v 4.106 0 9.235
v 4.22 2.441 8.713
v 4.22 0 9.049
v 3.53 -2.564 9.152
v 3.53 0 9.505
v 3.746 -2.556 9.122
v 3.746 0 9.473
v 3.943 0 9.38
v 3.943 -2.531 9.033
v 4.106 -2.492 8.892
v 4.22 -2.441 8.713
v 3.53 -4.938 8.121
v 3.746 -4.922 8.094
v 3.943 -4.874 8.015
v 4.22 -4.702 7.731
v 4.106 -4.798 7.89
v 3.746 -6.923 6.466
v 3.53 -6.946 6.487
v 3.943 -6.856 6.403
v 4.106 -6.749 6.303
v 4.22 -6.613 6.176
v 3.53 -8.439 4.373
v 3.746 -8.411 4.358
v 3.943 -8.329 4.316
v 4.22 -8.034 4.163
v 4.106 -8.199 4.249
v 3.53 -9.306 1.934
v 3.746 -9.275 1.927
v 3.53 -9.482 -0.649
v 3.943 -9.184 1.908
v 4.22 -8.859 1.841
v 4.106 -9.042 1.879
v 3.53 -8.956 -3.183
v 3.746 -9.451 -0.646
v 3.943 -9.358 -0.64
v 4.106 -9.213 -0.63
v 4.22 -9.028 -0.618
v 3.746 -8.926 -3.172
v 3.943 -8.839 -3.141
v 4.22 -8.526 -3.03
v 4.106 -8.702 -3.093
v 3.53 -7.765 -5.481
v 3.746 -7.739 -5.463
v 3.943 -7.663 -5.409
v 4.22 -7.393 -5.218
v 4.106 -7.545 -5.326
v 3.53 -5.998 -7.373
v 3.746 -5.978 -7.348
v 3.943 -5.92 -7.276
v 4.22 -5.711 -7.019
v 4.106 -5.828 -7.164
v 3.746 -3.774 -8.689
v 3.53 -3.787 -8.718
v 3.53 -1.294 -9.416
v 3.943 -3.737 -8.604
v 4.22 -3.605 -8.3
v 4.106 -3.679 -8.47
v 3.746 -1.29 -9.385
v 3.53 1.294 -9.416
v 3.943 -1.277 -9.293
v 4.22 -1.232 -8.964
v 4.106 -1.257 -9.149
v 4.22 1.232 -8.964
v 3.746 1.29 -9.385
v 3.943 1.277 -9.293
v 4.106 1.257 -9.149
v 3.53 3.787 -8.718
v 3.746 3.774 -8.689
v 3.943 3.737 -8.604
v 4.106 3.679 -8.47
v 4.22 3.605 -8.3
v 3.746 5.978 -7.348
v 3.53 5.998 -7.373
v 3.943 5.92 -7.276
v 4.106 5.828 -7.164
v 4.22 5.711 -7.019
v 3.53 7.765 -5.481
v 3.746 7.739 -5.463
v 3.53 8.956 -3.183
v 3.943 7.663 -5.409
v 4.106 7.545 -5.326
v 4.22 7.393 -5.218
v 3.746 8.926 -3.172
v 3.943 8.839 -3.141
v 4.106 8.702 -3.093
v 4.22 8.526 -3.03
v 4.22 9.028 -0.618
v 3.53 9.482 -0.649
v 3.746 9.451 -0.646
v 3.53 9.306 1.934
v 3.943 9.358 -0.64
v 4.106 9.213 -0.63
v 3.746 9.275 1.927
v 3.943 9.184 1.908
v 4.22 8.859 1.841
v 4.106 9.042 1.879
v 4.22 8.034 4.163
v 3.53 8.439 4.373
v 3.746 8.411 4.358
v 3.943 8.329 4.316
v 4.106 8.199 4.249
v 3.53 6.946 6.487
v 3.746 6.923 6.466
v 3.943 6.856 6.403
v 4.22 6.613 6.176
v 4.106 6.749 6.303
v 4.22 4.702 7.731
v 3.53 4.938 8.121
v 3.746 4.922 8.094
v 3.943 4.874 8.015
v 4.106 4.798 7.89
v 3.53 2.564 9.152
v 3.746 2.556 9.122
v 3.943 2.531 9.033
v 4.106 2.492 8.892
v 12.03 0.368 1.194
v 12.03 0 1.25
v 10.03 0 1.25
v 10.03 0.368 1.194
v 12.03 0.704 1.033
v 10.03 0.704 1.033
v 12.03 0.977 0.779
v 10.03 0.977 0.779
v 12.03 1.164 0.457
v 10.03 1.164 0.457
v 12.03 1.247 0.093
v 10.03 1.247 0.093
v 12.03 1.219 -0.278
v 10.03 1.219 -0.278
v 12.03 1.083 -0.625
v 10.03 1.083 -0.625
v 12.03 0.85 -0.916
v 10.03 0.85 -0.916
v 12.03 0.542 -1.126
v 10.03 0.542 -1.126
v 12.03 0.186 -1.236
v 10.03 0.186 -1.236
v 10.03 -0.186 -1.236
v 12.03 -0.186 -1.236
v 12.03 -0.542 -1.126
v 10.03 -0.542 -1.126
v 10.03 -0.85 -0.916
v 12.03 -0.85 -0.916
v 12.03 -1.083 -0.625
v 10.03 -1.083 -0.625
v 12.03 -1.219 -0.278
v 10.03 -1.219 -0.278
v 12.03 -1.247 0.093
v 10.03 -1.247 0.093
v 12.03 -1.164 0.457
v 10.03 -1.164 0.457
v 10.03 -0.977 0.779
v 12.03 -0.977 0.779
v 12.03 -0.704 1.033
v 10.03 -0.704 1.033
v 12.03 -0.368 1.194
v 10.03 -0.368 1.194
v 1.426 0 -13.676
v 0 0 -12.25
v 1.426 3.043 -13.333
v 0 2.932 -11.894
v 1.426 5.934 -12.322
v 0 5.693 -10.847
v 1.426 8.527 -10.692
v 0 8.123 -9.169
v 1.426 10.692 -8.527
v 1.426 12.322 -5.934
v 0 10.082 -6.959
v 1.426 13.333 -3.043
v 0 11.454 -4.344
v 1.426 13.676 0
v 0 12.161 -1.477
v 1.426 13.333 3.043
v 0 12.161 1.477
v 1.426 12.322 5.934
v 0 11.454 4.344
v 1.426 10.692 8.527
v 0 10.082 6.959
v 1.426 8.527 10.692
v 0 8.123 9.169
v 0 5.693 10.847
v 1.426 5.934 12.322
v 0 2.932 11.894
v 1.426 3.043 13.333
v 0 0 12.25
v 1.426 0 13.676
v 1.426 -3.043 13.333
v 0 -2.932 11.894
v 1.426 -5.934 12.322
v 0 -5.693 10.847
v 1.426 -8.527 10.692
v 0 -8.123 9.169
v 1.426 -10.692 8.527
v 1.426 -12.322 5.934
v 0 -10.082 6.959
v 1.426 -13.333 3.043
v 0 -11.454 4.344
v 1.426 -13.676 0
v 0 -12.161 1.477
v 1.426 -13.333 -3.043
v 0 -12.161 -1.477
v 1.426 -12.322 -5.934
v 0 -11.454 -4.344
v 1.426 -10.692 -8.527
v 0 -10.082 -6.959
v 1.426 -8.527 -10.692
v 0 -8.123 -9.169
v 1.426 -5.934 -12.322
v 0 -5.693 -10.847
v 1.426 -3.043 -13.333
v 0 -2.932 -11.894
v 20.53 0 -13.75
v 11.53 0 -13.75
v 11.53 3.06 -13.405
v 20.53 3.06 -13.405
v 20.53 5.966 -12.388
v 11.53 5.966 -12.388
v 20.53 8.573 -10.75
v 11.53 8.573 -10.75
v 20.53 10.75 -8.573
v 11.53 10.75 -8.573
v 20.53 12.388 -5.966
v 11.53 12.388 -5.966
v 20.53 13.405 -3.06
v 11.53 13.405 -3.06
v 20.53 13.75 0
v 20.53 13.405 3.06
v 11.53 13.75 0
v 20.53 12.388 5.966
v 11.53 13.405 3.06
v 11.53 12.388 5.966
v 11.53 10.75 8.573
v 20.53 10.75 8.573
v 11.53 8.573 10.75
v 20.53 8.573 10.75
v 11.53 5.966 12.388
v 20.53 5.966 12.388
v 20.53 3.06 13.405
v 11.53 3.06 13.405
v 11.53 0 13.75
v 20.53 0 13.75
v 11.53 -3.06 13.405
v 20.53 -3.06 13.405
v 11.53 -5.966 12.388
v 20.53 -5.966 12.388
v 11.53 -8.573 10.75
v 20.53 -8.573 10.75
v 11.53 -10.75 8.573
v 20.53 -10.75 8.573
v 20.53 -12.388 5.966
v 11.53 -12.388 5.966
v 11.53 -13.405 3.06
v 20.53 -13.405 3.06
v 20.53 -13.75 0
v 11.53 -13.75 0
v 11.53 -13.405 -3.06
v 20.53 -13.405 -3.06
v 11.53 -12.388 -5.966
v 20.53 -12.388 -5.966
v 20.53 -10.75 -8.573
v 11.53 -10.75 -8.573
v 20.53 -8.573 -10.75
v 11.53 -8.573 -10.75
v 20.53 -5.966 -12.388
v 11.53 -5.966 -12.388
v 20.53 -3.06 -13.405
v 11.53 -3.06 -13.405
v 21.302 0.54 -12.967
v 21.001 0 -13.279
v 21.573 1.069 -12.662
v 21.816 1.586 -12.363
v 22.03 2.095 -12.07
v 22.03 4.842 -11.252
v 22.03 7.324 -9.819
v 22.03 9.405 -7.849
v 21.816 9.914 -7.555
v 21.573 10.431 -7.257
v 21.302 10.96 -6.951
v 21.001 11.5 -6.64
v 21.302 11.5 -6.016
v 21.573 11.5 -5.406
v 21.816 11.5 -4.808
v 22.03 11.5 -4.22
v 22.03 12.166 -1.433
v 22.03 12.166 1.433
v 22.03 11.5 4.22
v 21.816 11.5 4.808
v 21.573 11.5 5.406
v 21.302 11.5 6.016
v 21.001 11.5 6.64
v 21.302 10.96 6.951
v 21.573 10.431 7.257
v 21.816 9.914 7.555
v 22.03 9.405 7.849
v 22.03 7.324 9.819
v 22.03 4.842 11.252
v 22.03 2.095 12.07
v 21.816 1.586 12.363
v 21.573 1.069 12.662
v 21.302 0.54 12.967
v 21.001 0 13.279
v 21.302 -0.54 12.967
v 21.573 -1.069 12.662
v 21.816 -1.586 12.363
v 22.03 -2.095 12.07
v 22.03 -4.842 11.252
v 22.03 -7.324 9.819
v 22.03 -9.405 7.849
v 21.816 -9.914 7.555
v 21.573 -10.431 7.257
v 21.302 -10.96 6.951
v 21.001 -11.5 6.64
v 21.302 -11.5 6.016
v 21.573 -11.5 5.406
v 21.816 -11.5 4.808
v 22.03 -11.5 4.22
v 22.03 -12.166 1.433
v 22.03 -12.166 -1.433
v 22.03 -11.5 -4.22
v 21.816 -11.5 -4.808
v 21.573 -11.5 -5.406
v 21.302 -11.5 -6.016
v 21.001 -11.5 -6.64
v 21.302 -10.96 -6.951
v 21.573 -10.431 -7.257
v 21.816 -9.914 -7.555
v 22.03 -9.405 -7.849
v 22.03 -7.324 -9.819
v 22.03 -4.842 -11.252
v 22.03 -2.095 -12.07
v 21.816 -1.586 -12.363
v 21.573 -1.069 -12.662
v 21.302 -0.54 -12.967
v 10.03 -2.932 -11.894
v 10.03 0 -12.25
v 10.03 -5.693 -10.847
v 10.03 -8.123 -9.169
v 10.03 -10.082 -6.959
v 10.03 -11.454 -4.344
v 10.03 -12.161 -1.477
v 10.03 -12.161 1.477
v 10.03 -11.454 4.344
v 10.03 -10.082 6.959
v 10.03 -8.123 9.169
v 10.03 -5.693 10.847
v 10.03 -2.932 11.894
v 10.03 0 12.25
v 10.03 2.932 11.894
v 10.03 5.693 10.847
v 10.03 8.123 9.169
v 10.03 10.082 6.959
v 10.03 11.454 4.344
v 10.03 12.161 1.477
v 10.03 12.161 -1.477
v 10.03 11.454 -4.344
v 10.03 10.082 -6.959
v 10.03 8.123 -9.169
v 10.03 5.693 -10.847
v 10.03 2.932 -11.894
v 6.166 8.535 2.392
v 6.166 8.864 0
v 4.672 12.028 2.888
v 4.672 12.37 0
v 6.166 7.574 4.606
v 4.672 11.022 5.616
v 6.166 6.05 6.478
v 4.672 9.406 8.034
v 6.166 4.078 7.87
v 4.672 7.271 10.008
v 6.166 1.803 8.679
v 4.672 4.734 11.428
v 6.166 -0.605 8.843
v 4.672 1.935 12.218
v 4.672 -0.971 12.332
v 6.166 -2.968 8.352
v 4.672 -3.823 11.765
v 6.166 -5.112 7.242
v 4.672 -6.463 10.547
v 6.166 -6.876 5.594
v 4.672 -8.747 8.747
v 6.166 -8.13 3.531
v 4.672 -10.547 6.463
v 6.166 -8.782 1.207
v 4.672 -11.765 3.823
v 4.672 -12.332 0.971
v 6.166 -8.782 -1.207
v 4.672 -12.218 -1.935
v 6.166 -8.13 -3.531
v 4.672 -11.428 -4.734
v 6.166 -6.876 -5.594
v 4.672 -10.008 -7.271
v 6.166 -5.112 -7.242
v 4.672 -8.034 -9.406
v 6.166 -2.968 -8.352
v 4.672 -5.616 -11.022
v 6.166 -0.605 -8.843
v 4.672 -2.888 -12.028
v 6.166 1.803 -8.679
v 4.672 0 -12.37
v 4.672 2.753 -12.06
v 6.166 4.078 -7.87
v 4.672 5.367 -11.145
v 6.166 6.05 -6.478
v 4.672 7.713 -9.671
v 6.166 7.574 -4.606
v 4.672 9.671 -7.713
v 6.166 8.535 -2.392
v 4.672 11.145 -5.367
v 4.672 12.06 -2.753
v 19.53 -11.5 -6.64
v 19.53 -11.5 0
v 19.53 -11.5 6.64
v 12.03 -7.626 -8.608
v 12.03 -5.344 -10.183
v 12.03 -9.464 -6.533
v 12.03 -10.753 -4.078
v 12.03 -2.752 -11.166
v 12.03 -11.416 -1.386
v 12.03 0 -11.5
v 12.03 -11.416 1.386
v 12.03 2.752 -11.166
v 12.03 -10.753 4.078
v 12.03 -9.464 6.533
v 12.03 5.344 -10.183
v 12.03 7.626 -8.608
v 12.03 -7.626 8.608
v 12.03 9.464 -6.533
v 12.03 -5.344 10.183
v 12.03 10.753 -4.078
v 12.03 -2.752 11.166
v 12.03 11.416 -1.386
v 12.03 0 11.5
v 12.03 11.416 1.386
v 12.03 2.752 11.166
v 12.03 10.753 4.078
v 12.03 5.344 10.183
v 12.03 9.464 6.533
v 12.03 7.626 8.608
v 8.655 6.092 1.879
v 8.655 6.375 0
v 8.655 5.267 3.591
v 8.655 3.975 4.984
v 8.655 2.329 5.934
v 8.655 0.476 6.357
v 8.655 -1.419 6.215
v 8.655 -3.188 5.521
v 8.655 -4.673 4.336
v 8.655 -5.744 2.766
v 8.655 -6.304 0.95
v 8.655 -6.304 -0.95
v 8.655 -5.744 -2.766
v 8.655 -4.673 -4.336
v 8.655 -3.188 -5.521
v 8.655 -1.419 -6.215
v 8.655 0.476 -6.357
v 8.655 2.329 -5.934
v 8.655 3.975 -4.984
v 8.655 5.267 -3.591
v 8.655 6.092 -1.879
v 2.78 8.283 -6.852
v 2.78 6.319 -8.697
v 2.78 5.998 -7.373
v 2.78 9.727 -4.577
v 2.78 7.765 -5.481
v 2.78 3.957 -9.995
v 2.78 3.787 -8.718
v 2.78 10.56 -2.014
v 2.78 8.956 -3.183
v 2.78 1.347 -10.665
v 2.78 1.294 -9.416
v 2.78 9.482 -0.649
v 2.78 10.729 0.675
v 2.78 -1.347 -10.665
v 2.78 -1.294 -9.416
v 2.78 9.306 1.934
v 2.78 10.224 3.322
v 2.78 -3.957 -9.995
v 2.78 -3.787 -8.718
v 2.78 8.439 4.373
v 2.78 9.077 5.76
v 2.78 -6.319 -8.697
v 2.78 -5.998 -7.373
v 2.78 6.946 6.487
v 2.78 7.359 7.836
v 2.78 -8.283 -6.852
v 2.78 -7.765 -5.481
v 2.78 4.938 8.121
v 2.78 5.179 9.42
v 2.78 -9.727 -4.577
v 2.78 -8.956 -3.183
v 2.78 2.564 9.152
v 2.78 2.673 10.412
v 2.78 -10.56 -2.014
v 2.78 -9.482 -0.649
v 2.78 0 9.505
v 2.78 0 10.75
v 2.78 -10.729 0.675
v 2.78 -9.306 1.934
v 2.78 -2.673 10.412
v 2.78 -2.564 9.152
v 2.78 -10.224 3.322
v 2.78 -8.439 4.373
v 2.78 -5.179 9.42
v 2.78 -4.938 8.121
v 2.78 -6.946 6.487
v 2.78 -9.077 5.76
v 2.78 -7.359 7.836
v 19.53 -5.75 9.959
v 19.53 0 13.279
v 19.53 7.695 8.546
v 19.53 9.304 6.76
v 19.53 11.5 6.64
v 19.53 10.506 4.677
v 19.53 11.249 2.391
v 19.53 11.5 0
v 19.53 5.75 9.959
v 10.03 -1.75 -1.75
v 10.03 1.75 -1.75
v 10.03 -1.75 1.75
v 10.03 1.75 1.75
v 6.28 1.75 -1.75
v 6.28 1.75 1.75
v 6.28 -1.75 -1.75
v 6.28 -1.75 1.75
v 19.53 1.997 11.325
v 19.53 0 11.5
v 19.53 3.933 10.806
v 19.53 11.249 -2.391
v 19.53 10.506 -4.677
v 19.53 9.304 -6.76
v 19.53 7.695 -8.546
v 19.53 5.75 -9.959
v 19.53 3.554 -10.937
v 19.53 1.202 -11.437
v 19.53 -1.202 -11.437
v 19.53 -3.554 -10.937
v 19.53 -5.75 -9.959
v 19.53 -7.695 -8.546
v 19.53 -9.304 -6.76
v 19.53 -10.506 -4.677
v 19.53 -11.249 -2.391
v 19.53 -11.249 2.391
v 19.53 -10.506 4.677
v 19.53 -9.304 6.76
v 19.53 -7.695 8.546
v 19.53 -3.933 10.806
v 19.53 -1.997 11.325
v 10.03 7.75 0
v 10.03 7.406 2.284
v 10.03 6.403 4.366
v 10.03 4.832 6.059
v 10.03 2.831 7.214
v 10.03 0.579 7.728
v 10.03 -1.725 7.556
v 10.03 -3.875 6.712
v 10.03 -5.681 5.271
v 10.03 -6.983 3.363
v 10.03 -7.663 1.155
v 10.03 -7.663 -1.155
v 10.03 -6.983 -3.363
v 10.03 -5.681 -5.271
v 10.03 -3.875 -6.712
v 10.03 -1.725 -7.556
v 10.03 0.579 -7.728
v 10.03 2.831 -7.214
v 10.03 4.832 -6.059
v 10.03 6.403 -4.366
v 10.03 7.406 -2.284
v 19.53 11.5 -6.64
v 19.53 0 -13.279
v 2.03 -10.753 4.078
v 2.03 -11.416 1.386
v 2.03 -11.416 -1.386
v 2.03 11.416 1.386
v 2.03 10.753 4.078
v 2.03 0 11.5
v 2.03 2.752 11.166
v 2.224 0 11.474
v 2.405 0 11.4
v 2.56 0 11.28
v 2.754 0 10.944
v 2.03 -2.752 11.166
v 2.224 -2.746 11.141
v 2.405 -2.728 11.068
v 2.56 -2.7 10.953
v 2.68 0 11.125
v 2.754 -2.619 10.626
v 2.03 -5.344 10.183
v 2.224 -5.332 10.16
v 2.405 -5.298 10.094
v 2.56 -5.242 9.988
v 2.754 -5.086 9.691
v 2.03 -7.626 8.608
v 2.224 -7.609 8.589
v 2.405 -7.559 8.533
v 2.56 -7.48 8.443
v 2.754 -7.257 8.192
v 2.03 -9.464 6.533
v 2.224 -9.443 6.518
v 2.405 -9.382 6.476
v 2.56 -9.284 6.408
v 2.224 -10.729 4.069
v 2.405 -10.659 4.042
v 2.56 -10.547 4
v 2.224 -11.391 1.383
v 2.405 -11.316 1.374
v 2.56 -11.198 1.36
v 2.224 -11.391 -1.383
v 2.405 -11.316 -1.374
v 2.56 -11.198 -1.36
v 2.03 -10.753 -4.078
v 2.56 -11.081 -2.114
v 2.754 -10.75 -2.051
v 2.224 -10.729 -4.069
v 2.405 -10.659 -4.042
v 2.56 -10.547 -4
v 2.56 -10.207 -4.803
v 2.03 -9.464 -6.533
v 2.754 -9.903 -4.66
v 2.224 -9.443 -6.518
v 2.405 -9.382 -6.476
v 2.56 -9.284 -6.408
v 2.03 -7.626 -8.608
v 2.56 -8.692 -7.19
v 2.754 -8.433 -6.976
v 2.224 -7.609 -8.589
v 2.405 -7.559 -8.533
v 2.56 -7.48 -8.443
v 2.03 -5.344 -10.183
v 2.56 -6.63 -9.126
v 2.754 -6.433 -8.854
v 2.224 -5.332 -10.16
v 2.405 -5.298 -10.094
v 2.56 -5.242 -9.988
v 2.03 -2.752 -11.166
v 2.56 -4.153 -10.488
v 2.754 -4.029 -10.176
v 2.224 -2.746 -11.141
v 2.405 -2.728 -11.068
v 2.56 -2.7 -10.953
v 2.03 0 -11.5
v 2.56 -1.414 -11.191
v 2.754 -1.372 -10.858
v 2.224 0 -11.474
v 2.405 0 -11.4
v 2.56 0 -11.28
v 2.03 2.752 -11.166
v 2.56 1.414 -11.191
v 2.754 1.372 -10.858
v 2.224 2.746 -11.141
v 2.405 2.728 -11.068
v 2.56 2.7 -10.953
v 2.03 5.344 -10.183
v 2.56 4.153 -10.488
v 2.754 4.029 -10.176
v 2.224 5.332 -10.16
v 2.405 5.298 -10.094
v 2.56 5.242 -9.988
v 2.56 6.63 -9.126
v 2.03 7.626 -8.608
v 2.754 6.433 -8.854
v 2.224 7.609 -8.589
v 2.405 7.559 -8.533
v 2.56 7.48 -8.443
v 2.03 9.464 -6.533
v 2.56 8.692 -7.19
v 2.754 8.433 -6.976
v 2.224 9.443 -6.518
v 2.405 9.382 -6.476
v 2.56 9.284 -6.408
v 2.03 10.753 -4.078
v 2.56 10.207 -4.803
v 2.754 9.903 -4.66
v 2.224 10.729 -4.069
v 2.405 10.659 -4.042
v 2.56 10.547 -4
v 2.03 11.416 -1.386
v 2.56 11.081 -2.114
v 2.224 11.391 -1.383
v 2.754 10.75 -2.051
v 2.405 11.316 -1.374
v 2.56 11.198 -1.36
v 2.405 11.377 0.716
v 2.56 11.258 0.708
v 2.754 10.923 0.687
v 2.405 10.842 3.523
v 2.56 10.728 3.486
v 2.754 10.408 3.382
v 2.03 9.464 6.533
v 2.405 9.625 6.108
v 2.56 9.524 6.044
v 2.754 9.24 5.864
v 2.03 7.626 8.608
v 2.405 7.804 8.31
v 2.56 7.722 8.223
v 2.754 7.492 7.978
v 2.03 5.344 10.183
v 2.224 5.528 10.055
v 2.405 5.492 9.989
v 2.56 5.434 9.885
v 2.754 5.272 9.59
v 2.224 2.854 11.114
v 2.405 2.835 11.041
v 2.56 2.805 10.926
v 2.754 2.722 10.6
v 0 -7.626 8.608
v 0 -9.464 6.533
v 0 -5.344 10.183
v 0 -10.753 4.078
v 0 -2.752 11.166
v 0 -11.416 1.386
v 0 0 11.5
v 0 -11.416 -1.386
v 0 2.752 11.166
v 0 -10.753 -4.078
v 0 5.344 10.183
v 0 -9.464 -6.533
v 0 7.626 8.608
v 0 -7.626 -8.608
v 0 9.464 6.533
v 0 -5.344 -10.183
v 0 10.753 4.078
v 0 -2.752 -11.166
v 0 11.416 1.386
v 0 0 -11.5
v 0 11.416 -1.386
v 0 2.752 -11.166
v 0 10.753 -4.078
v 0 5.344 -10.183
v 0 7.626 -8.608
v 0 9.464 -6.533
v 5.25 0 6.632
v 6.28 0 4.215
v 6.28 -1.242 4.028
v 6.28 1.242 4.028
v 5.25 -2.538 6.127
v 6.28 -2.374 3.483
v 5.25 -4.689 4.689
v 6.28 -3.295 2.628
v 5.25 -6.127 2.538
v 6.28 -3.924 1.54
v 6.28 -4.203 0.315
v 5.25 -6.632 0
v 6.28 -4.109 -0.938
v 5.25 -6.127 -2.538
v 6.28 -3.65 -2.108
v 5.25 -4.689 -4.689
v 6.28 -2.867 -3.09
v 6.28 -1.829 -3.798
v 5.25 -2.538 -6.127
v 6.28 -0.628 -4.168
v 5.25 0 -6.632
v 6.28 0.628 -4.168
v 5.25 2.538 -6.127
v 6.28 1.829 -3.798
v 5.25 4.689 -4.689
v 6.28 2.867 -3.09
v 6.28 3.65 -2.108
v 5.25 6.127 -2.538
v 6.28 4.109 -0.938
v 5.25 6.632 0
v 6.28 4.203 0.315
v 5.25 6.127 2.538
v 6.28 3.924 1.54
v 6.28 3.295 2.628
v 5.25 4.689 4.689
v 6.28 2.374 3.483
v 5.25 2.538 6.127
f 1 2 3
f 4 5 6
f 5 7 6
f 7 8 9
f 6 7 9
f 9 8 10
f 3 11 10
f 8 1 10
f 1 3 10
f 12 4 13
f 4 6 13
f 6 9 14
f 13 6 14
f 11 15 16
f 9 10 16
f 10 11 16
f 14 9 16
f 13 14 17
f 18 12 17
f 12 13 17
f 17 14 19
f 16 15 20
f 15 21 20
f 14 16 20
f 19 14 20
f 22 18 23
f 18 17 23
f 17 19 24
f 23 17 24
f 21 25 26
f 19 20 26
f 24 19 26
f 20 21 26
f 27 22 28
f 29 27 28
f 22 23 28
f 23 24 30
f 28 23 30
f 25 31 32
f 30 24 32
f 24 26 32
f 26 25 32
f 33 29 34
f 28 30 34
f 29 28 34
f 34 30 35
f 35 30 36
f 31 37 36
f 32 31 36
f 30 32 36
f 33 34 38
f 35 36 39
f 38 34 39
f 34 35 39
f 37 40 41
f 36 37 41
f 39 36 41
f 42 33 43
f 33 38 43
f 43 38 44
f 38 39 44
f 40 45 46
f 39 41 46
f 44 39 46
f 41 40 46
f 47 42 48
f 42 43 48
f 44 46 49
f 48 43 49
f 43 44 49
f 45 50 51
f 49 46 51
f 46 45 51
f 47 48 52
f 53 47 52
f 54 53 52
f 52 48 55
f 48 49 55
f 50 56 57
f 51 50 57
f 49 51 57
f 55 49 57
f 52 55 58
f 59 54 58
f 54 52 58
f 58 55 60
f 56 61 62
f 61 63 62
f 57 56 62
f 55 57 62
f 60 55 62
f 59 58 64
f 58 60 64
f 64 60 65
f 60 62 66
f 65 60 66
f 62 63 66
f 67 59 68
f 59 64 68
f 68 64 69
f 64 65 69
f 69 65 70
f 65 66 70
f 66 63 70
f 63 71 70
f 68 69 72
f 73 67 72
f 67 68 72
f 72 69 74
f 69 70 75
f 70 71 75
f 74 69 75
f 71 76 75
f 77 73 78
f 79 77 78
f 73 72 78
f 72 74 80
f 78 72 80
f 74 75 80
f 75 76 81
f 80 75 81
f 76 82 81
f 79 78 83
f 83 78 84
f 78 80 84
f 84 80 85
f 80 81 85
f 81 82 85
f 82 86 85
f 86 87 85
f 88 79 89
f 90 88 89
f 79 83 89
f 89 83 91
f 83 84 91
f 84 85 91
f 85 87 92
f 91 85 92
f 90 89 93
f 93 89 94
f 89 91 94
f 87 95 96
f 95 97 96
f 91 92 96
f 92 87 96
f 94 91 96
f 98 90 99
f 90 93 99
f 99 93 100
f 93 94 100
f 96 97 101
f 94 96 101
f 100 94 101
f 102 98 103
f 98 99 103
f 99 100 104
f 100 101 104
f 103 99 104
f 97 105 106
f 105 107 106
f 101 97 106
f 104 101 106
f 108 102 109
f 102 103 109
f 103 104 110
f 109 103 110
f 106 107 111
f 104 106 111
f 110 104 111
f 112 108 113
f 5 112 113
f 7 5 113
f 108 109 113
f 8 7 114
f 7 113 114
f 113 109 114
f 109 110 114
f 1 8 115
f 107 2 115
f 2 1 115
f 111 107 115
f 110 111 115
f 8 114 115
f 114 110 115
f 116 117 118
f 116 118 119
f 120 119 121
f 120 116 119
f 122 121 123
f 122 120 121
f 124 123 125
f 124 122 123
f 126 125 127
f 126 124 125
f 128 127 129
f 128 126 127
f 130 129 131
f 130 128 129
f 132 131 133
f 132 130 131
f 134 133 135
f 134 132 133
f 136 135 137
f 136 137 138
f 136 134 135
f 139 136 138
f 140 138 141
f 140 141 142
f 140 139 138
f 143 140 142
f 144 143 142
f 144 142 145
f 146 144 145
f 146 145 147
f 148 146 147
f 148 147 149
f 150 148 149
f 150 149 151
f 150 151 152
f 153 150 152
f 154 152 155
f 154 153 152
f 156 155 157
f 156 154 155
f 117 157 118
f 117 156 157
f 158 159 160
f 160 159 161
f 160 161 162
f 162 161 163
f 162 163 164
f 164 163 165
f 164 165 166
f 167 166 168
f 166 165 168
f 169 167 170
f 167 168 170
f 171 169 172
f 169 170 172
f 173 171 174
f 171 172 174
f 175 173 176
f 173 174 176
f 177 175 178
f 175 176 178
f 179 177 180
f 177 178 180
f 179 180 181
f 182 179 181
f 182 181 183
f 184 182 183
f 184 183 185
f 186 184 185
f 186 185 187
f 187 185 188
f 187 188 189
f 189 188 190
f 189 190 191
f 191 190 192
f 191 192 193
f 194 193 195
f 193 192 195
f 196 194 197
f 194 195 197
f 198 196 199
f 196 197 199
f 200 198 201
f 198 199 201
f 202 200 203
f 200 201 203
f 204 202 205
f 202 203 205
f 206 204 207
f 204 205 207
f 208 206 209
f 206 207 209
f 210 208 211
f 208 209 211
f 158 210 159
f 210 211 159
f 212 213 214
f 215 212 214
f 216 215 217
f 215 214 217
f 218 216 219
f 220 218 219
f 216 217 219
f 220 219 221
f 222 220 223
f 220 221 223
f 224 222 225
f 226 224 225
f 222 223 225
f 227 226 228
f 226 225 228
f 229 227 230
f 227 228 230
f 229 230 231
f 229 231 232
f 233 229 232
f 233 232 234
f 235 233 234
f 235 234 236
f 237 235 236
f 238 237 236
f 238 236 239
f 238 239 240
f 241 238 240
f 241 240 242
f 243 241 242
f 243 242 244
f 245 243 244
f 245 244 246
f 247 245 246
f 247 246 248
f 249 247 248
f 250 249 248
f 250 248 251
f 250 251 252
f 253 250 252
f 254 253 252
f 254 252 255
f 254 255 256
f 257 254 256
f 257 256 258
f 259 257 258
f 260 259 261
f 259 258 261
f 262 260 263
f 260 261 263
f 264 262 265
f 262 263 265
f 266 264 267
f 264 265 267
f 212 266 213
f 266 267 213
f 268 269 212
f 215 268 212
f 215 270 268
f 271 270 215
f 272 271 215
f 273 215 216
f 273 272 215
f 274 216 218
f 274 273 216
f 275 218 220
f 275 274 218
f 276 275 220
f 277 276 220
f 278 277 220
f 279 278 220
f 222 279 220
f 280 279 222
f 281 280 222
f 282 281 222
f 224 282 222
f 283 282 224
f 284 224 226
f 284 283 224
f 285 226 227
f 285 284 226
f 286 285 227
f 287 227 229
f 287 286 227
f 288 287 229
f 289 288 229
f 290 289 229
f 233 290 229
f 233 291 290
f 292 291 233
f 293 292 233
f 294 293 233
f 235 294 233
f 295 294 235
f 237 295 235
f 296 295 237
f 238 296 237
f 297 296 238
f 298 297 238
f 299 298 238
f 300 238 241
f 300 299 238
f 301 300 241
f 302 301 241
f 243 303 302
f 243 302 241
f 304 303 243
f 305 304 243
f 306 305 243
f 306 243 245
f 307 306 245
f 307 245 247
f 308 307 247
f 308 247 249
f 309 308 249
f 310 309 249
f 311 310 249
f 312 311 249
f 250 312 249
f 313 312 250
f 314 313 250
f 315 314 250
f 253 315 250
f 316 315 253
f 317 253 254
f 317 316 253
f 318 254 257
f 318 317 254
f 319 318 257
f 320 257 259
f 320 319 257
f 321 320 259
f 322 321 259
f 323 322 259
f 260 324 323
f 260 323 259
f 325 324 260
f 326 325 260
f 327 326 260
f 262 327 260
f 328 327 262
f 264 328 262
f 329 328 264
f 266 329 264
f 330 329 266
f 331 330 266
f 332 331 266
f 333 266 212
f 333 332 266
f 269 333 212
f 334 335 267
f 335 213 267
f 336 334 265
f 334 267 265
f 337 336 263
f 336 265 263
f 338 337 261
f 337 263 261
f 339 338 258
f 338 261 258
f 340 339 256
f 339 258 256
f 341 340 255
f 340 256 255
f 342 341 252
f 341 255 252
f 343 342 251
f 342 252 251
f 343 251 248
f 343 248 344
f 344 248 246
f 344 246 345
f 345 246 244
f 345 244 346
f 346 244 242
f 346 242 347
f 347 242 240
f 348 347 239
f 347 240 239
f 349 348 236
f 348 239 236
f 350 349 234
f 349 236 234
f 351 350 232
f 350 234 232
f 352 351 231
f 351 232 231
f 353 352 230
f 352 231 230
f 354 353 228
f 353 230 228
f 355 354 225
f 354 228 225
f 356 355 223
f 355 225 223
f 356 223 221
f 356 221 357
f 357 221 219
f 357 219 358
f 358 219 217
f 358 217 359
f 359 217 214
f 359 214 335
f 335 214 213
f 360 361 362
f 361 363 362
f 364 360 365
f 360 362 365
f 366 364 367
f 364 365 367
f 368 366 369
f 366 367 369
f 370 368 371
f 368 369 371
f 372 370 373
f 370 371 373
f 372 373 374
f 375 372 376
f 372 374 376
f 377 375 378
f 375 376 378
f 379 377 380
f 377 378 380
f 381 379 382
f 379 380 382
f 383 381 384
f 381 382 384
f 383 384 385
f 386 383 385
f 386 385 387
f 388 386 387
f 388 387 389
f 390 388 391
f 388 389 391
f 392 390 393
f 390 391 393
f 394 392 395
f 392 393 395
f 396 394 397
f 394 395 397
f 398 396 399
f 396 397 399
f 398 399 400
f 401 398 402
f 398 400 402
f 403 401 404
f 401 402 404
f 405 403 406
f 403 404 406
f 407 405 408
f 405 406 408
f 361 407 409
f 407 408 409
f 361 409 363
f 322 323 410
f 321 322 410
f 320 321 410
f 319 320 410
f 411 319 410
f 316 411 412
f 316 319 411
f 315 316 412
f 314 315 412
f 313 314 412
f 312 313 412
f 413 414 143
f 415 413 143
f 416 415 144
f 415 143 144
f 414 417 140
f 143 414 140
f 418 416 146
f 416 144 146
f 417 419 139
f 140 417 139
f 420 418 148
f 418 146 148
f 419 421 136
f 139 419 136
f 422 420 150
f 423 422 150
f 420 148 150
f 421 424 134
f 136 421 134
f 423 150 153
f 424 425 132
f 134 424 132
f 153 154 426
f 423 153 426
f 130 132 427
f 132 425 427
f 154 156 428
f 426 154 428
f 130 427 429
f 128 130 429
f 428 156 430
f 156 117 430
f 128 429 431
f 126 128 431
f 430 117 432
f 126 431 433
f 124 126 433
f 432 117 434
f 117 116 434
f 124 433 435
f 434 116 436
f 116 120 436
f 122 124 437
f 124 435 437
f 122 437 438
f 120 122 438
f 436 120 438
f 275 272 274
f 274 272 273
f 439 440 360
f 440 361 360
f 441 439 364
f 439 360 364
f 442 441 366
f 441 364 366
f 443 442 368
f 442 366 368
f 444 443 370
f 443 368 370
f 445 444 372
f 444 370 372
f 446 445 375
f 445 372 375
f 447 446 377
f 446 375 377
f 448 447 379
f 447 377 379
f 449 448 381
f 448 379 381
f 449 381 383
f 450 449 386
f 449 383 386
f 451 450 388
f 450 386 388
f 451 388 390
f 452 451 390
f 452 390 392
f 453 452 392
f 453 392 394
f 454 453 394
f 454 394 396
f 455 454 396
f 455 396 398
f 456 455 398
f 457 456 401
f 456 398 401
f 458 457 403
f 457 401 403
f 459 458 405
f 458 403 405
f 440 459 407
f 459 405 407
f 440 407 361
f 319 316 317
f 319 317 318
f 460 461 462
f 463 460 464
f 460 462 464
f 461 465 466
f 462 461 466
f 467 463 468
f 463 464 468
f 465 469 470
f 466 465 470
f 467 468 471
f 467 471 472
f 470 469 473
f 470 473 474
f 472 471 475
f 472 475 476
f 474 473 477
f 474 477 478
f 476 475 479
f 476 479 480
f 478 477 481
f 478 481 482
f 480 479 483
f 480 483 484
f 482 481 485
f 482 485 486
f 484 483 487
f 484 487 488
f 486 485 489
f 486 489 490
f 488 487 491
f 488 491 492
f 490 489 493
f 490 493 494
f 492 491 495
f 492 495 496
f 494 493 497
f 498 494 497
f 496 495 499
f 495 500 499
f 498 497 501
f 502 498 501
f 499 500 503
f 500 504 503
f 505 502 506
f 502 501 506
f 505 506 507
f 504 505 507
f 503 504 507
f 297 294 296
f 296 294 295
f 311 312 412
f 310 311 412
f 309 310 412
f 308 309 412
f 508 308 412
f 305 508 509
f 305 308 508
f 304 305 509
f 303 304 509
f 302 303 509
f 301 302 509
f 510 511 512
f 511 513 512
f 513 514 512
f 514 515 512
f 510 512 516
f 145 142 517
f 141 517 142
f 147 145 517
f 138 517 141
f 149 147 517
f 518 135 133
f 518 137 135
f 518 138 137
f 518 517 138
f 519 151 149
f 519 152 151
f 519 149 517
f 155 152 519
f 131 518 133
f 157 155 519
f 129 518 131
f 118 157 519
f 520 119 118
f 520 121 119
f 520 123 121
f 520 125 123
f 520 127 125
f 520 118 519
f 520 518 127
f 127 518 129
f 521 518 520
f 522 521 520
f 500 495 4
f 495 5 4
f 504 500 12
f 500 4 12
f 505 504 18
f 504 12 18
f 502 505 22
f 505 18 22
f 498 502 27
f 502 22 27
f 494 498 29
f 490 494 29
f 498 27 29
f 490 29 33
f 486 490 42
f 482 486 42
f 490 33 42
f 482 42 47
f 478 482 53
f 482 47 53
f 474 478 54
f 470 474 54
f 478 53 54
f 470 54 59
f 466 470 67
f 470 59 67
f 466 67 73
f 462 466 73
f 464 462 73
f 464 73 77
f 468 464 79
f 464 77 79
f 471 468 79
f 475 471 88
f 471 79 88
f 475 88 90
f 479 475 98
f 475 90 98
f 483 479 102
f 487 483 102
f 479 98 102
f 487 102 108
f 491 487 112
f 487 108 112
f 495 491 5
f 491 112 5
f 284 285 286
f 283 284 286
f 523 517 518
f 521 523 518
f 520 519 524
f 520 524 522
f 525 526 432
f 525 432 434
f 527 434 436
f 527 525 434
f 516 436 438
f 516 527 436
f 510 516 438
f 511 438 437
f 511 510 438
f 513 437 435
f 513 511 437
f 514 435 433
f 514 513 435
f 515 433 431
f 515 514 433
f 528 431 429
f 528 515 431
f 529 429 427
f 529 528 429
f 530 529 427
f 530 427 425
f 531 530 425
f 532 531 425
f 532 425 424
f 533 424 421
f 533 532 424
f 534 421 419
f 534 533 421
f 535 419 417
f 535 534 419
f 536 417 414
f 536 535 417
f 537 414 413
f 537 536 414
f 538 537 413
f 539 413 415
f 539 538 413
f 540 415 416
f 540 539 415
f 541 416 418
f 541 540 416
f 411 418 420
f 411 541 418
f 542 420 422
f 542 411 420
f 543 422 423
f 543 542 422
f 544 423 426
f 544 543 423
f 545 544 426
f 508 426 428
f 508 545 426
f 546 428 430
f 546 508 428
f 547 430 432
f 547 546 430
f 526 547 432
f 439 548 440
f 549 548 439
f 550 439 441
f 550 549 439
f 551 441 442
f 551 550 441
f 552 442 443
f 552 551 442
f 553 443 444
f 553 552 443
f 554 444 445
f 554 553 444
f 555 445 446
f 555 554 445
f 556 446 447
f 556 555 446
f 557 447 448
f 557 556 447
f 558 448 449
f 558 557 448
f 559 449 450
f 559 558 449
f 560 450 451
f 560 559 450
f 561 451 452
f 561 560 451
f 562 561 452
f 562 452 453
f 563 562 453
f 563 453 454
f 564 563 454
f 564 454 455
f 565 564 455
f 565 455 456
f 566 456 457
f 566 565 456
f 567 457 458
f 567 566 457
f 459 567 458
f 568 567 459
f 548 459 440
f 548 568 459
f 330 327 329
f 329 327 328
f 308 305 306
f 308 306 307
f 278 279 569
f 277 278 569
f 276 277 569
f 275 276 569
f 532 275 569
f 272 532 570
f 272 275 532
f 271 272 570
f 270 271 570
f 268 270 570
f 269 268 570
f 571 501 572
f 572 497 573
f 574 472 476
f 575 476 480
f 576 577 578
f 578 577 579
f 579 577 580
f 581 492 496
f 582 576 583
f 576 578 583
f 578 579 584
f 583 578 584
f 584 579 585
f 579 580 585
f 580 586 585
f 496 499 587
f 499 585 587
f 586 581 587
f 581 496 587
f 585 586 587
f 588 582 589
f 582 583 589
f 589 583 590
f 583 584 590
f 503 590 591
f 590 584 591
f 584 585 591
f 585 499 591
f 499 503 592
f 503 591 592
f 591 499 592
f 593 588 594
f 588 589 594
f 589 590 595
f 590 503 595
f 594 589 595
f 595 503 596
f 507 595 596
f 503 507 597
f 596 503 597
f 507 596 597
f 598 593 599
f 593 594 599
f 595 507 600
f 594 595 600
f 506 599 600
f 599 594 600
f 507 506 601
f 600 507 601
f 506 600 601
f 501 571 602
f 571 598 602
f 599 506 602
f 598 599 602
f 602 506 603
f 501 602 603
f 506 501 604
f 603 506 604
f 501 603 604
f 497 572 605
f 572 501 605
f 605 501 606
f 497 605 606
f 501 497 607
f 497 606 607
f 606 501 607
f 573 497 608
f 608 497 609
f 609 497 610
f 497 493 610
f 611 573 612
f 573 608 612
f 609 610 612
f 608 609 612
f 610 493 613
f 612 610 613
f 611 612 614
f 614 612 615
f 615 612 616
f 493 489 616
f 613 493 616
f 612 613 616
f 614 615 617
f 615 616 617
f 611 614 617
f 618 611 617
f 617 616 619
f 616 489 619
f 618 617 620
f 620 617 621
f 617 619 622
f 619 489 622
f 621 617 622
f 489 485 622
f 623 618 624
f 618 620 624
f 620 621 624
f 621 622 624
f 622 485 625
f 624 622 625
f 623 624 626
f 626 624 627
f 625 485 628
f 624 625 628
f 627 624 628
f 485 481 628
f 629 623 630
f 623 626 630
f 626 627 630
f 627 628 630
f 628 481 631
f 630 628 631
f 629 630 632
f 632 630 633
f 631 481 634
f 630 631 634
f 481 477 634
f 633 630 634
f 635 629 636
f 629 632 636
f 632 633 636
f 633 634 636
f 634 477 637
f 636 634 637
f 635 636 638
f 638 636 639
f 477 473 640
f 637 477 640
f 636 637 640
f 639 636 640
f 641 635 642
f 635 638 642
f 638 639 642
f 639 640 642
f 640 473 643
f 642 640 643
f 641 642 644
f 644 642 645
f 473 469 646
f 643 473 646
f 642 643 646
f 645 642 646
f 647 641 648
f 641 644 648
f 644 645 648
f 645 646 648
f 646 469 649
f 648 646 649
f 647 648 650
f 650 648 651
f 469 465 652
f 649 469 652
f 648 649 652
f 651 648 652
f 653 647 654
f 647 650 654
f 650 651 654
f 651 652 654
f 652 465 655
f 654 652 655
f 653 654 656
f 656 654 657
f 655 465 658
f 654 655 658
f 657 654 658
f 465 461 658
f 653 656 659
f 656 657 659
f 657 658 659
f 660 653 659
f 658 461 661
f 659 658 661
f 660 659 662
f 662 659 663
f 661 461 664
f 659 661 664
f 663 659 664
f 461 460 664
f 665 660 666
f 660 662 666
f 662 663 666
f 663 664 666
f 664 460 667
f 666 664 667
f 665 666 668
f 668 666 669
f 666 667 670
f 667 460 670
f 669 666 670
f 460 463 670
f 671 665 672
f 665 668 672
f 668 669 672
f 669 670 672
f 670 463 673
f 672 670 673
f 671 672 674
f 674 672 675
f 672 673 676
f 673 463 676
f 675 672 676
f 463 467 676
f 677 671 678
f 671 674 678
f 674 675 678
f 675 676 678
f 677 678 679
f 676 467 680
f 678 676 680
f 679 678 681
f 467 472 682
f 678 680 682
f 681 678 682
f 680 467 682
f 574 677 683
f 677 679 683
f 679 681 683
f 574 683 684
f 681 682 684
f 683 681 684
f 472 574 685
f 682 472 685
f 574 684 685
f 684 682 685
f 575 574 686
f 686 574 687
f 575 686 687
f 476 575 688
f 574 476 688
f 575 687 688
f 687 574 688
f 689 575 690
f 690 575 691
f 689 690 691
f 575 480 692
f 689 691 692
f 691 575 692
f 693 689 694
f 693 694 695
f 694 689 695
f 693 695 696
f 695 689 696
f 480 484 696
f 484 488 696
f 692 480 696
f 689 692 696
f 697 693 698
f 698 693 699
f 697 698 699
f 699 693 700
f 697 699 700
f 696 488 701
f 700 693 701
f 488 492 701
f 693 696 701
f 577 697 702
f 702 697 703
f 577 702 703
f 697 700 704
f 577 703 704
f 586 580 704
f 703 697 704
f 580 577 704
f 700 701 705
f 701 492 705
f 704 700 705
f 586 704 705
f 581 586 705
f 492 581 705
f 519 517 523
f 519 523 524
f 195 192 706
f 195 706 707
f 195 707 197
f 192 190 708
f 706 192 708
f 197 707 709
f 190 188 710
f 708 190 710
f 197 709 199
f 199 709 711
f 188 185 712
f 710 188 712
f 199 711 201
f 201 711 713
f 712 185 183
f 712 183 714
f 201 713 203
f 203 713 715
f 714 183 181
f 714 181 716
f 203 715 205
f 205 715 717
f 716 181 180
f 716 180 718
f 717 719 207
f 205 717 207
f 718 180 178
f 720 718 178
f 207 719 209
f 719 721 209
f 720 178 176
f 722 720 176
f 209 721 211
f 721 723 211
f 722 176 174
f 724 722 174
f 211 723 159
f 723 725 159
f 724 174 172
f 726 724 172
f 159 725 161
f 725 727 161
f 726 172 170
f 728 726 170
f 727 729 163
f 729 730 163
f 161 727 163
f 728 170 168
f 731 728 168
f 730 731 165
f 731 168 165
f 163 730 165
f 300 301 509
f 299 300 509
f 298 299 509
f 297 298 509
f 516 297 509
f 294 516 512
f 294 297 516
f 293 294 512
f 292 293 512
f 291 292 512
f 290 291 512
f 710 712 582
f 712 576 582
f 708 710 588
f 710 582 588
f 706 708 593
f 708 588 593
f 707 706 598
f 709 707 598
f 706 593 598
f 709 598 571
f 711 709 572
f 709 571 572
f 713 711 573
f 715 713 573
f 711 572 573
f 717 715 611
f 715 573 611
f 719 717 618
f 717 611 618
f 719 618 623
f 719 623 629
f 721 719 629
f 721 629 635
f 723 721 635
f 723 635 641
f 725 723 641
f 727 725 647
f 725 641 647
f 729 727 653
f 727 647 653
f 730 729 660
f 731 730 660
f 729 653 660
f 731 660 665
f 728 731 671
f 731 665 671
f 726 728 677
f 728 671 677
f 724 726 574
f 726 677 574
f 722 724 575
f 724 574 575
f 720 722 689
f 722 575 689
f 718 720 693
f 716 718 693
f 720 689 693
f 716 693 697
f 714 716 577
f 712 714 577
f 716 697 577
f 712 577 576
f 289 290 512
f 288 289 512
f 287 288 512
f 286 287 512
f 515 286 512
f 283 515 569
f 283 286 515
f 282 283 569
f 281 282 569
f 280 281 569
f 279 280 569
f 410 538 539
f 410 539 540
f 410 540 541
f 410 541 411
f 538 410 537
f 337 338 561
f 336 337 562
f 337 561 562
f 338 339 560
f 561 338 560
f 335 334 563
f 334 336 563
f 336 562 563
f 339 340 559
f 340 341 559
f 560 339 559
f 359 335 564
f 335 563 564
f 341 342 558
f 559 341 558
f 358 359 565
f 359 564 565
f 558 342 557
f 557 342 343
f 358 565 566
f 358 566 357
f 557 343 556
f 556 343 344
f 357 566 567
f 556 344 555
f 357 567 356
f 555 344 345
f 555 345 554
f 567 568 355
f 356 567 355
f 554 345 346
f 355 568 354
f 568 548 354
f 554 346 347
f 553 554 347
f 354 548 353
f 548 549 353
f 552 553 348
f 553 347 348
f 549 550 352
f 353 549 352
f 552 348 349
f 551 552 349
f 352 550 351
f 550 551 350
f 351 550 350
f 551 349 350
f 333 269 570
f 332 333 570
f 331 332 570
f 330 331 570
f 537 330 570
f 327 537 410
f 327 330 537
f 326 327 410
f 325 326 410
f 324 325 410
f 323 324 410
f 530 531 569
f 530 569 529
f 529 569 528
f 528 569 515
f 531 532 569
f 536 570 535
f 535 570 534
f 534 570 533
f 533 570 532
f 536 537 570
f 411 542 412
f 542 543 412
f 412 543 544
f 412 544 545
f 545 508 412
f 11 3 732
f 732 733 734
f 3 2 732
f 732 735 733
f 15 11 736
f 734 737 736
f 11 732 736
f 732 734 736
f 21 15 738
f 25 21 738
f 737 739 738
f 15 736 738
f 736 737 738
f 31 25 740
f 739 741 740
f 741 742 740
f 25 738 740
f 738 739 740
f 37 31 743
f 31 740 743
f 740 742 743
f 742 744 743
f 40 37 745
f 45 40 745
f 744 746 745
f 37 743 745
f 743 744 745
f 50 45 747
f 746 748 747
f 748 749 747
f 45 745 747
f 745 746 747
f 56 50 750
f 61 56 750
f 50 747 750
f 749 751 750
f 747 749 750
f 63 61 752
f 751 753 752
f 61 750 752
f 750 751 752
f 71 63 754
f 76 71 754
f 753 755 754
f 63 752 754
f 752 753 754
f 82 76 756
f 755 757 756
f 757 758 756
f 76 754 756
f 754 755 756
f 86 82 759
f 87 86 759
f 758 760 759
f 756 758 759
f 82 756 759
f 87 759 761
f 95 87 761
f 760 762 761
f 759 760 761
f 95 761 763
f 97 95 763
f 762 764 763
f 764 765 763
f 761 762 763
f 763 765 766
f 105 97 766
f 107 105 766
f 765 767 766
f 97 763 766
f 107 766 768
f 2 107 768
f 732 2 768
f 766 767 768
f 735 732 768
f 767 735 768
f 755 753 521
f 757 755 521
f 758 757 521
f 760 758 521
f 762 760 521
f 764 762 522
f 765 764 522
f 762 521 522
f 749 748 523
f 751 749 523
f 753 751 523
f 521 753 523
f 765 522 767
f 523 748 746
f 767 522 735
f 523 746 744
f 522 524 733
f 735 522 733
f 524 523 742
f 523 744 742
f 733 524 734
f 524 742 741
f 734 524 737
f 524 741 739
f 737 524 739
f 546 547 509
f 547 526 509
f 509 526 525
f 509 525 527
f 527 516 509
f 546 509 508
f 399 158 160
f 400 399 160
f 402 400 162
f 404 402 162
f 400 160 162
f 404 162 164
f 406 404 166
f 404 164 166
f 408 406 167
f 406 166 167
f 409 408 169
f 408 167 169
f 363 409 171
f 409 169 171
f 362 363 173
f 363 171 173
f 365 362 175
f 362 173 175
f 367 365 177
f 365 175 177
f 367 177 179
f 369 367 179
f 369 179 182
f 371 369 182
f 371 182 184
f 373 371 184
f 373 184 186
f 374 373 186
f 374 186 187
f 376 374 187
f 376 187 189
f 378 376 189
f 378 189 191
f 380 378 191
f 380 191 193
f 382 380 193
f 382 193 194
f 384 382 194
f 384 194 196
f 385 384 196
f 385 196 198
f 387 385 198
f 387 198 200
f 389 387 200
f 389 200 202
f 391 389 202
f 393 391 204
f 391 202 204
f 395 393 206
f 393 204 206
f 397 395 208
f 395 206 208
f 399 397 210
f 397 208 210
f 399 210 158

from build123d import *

# Parameters (mm, degrees)
SKETCH1_R           = 13.75
BOSS_EXTRUDE1_DEPTH = 22.03
SKETCH3_W           = 3.5
SKETCH3_H           = 3.5
CUT_EXTRUDE1_DEPTH  = 3.75
CUT_EXTRUDE2_START  = -12
CUT_EXTRUDE2_DEPTH  = 2.5
CUT_EXTRUDE4_START  = -9.5
SKETCH4_29_R        = 11.5
CUT_EXTRUDE4_DEPTH  = 7.5
CUT_EXTRUDE5_START  = -2
SKETCH4_30_R        = 1.25
CUT_EXTRUDE5_DEPTH  = 2
CHAMFER1_SIZE       = 1.5
CHAMFER2_SIZE       = 1.5
CHAMFER2_SIZE_2     = 2.841585372


# Read off the part's stored shape, not the designer's step: Cut-Revolve-Thin1
with BuildPart() as part:
    # Sketch1 → Boss-Extrude1 (new body)
    with BuildSketch(Plane(origin=(0, 0, 0), x_dir=(0, 0, -1), z_dir=(1, 0, 0))):
        Circle(SKETCH1_R)
    extrude(amount=BOSS_EXTRUDE1_DEPTH)

    # Sketch2 → Cut-Revolve1 (revolve, cut)
    with BuildSketch(Plane(origin=(46.159172163, 0, 11.54266395), x_dir=(0, 0, 1), z_dir=(0, 1, 0)), mode=Mode.PRIVATE) as cut_revolve1_sk:
        with BuildLine():
            Line((-22.29266395, -43.379172163), (-21.047307804, -43.379172163))
            Line((-21.047307804, -43.379172163), (-21.047307804, -42.629172163))
            ThreePointArc((-21.047307804, -42.629172163), (-20.923021734, -42.215672371), (-20.591355596, -41.939218617))
            Line((-20.591355596, -41.939218617), (-15.75766395, -39.879172163))
            Line((-15.75766395, -39.879172163), (-11.54266395, -39.879172163))
            Line((-11.54266395, -39.879172163), (-11.54266395, -46.159172163))
            Line((-11.54266395, -46.159172163), (-23.04266395, -46.159172163))
            Line((-23.04266395, -46.159172163), (-23.04266395, -44.129172163))
            ThreePointArc((-23.04266395, -44.129172163), (-22.822994036, -43.598842077), (-22.29266395, -43.379172163))
        make_face()
    revolve(cut_revolve1_sk.sketch.rotate(Axis((-993.090827837, 0, 0), (1, 0, 0)), 180), axis=Axis((-993.090827837, 0, 0), (1, 0, 0)), mode=Mode.SUBTRACT)

    # Sketch3 → Cut-Extrude1 (cut)
    with BuildSketch(Plane.ZY.offset(-6.28)):
        Rectangle(SKETCH3_W, SKETCH3_H)
    extrude(amount=-CUT_EXTRUDE1_DEPTH, mode=Mode.SUBTRACT)

    # Sketch4 → Cut-Extrude2 (cut)
    with BuildSketch(Plane(origin=(10.03, 32, 0), x_dir=(0, 0, 1), z_dir=(-1, 0, 0)).offset(CUT_EXTRUDE2_START)):
        Polygon((-6.639528096, -20.5), (-13.279056191, -32), (-6.639528096, -43.5), (6.639528096, -43.5), (13.279056191, -32), (6.639528096, -20.5), align=None)
    extrude(amount=CUT_EXTRUDE2_DEPTH, mode=Mode.SUBTRACT)

    # Sketch4<29> → Cut-Extrude4 (cut)
    with BuildSketch(Plane(origin=(10.03, 32, 0), x_dir=(0, 0, 1), z_dir=(-1, 0, 0)).offset(CUT_EXTRUDE4_START)):
        with Locations((0, -32)):
            Circle(SKETCH4_29_R)
    extrude(amount=CUT_EXTRUDE4_DEPTH, mode=Mode.SUBTRACT)

    # Sketch4<30> → Cut-Extrude5 (cut)
    with BuildSketch(Plane(origin=(10.03, 32, 0), x_dir=(0, 0, 1), z_dir=(-1, 0, 0)).offset(CUT_EXTRUDE5_START)):
        with Locations((0, -32)):
            Circle(SKETCH4_30_R)
    extrude(amount=CUT_EXTRUDE5_DEPTH, mode=Mode.SUBTRACT)

    # Cut-Revolve-Thin1 outline → Cut-Revolve-Thin1 (revolve, cut)
    with BuildSketch(Plane.YX):
        Polygon((13.75, 10.03), (6.25, 10.03), (6.25, 7.28), (13.75, 4.083613153), align=None)
    revolve(axis=Axis((0, 0, 0), (1, 0, 0)), mode=Mode.SUBTRACT)

    # Chamfer1
    # the kernel refuses this chamfer: 1.5 mm, written as the material it adds along each edge
    with BuildSketch(Plane(origin=(10.03, 0, 0), x_dir=(0, 1, 0), z_dir=(0, 0, -1))) as chamfer1_piece_1:
        Polygon((6.25, -CHAMFER1_SIZE), (6.25 + CHAMFER1_SIZE, 0), (6.25, 0), align=None)
    revolve(axis=Axis((10.03, 0, 0), (1, 0, 0)))
    # the kernel refuses this chamfer: 1.5 mm, written as the material it takes off along each edge
    with BuildSketch(Plane(origin=(0, 0, 0), x_dir=(0, 0, -1), z_dir=(0, -1, 0))) as chamfer1_2_piece_1:
        Polygon((13.75, CHAMFER1_SIZE), (13.75 - CHAMFER1_SIZE, 0), (13.75, 0), align=None)
    revolve(axis=Axis((0, 0, 0), (1, 0, 0)), mode=Mode.SUBTRACT)
    with BuildSketch(Plane(origin=(22.03, 0, 0), x_dir=(0, 0, -1), z_dir=(0, -1, 0))) as chamfer1_2_piece_2:
        Polygon((13.75, -CHAMFER1_SIZE), (13.75 - CHAMFER1_SIZE, 0), (13.75, 0), align=None)
    revolve(axis=Axis((22.03, 0, 0), (1, 0, 0)), mode=Mode.SUBTRACT)
    with BuildSketch(Plane(origin=(10.03, 0, 0), x_dir=(0, 0, -1), z_dir=(0, 1, 0))) as chamfer1_2_piece_3:
        Polygon((13.75 - CHAMFER1_SIZE, 0), (13.75, -CHAMFER1_SIZE), (13.75, 0), align=None)
    revolve(axis=Axis((10.03, 0, 0), (-1, 0, 0)), mode=Mode.SUBTRACT)

    # Chamfer2
    # the kernel refuses this chamfer: 2.841585372, 1.5 mm, written as the material it adds along each edge
    with BuildSketch(Plane(origin=(7.28, 0, 0), x_dir=(0, 1, 0), z_dir=(0, 0, -1))) as chamfer2_piece_1:
        Polygon((6.25, CHAMFER2_SIZE), (6.25 + CHAMFER2_SIZE_2 * 0.919938061778, -CHAMFER2_SIZE_2 * 0.392063722763), (6.25, 0), align=None)
    revolve(axis=Axis((7.28, 0, 0), (1, 0, 0)))
    # the kernel refuses this chamfer: 2.841585372, 1.5 mm, written as the material it takes off along each edge
    with BuildSketch(Plane(origin=(4.083613153, 0, 0), x_dir=(0, 1, 0), z_dir=(0, 0, -1))) as chamfer2_2_piece_1:
        Polygon((13.75 - CHAMFER2_SIZE * 0.919938061679, CHAMFER2_SIZE * 0.392063722721), (13.75, -CHAMFER2_SIZE_2), (13.75, 0), align=None)
    revolve(axis=Axis((4.083613153, 0, 0), (1, 0, 0)), revolution_arc=270, mode=Mode.SUBTRACT)
    with BuildSketch(Plane(origin=(4.083613153, 0, 0), x_dir=(0, 0, -1), z_dir=(0, -1, 0))) as chamfer2_2_piece_2:
        Polygon((13.75 - CHAMFER2_SIZE * 0.919938061679, CHAMFER2_SIZE * 0.392063722721), (13.75, -CHAMFER2_SIZE_2), (13.75, 0), align=None)
    revolve(axis=Axis((4.083613153, 0, 0), (1, 0, 0)), revolution_arc=90, mode=Mode.SUBTRACT)


solid = part.part
